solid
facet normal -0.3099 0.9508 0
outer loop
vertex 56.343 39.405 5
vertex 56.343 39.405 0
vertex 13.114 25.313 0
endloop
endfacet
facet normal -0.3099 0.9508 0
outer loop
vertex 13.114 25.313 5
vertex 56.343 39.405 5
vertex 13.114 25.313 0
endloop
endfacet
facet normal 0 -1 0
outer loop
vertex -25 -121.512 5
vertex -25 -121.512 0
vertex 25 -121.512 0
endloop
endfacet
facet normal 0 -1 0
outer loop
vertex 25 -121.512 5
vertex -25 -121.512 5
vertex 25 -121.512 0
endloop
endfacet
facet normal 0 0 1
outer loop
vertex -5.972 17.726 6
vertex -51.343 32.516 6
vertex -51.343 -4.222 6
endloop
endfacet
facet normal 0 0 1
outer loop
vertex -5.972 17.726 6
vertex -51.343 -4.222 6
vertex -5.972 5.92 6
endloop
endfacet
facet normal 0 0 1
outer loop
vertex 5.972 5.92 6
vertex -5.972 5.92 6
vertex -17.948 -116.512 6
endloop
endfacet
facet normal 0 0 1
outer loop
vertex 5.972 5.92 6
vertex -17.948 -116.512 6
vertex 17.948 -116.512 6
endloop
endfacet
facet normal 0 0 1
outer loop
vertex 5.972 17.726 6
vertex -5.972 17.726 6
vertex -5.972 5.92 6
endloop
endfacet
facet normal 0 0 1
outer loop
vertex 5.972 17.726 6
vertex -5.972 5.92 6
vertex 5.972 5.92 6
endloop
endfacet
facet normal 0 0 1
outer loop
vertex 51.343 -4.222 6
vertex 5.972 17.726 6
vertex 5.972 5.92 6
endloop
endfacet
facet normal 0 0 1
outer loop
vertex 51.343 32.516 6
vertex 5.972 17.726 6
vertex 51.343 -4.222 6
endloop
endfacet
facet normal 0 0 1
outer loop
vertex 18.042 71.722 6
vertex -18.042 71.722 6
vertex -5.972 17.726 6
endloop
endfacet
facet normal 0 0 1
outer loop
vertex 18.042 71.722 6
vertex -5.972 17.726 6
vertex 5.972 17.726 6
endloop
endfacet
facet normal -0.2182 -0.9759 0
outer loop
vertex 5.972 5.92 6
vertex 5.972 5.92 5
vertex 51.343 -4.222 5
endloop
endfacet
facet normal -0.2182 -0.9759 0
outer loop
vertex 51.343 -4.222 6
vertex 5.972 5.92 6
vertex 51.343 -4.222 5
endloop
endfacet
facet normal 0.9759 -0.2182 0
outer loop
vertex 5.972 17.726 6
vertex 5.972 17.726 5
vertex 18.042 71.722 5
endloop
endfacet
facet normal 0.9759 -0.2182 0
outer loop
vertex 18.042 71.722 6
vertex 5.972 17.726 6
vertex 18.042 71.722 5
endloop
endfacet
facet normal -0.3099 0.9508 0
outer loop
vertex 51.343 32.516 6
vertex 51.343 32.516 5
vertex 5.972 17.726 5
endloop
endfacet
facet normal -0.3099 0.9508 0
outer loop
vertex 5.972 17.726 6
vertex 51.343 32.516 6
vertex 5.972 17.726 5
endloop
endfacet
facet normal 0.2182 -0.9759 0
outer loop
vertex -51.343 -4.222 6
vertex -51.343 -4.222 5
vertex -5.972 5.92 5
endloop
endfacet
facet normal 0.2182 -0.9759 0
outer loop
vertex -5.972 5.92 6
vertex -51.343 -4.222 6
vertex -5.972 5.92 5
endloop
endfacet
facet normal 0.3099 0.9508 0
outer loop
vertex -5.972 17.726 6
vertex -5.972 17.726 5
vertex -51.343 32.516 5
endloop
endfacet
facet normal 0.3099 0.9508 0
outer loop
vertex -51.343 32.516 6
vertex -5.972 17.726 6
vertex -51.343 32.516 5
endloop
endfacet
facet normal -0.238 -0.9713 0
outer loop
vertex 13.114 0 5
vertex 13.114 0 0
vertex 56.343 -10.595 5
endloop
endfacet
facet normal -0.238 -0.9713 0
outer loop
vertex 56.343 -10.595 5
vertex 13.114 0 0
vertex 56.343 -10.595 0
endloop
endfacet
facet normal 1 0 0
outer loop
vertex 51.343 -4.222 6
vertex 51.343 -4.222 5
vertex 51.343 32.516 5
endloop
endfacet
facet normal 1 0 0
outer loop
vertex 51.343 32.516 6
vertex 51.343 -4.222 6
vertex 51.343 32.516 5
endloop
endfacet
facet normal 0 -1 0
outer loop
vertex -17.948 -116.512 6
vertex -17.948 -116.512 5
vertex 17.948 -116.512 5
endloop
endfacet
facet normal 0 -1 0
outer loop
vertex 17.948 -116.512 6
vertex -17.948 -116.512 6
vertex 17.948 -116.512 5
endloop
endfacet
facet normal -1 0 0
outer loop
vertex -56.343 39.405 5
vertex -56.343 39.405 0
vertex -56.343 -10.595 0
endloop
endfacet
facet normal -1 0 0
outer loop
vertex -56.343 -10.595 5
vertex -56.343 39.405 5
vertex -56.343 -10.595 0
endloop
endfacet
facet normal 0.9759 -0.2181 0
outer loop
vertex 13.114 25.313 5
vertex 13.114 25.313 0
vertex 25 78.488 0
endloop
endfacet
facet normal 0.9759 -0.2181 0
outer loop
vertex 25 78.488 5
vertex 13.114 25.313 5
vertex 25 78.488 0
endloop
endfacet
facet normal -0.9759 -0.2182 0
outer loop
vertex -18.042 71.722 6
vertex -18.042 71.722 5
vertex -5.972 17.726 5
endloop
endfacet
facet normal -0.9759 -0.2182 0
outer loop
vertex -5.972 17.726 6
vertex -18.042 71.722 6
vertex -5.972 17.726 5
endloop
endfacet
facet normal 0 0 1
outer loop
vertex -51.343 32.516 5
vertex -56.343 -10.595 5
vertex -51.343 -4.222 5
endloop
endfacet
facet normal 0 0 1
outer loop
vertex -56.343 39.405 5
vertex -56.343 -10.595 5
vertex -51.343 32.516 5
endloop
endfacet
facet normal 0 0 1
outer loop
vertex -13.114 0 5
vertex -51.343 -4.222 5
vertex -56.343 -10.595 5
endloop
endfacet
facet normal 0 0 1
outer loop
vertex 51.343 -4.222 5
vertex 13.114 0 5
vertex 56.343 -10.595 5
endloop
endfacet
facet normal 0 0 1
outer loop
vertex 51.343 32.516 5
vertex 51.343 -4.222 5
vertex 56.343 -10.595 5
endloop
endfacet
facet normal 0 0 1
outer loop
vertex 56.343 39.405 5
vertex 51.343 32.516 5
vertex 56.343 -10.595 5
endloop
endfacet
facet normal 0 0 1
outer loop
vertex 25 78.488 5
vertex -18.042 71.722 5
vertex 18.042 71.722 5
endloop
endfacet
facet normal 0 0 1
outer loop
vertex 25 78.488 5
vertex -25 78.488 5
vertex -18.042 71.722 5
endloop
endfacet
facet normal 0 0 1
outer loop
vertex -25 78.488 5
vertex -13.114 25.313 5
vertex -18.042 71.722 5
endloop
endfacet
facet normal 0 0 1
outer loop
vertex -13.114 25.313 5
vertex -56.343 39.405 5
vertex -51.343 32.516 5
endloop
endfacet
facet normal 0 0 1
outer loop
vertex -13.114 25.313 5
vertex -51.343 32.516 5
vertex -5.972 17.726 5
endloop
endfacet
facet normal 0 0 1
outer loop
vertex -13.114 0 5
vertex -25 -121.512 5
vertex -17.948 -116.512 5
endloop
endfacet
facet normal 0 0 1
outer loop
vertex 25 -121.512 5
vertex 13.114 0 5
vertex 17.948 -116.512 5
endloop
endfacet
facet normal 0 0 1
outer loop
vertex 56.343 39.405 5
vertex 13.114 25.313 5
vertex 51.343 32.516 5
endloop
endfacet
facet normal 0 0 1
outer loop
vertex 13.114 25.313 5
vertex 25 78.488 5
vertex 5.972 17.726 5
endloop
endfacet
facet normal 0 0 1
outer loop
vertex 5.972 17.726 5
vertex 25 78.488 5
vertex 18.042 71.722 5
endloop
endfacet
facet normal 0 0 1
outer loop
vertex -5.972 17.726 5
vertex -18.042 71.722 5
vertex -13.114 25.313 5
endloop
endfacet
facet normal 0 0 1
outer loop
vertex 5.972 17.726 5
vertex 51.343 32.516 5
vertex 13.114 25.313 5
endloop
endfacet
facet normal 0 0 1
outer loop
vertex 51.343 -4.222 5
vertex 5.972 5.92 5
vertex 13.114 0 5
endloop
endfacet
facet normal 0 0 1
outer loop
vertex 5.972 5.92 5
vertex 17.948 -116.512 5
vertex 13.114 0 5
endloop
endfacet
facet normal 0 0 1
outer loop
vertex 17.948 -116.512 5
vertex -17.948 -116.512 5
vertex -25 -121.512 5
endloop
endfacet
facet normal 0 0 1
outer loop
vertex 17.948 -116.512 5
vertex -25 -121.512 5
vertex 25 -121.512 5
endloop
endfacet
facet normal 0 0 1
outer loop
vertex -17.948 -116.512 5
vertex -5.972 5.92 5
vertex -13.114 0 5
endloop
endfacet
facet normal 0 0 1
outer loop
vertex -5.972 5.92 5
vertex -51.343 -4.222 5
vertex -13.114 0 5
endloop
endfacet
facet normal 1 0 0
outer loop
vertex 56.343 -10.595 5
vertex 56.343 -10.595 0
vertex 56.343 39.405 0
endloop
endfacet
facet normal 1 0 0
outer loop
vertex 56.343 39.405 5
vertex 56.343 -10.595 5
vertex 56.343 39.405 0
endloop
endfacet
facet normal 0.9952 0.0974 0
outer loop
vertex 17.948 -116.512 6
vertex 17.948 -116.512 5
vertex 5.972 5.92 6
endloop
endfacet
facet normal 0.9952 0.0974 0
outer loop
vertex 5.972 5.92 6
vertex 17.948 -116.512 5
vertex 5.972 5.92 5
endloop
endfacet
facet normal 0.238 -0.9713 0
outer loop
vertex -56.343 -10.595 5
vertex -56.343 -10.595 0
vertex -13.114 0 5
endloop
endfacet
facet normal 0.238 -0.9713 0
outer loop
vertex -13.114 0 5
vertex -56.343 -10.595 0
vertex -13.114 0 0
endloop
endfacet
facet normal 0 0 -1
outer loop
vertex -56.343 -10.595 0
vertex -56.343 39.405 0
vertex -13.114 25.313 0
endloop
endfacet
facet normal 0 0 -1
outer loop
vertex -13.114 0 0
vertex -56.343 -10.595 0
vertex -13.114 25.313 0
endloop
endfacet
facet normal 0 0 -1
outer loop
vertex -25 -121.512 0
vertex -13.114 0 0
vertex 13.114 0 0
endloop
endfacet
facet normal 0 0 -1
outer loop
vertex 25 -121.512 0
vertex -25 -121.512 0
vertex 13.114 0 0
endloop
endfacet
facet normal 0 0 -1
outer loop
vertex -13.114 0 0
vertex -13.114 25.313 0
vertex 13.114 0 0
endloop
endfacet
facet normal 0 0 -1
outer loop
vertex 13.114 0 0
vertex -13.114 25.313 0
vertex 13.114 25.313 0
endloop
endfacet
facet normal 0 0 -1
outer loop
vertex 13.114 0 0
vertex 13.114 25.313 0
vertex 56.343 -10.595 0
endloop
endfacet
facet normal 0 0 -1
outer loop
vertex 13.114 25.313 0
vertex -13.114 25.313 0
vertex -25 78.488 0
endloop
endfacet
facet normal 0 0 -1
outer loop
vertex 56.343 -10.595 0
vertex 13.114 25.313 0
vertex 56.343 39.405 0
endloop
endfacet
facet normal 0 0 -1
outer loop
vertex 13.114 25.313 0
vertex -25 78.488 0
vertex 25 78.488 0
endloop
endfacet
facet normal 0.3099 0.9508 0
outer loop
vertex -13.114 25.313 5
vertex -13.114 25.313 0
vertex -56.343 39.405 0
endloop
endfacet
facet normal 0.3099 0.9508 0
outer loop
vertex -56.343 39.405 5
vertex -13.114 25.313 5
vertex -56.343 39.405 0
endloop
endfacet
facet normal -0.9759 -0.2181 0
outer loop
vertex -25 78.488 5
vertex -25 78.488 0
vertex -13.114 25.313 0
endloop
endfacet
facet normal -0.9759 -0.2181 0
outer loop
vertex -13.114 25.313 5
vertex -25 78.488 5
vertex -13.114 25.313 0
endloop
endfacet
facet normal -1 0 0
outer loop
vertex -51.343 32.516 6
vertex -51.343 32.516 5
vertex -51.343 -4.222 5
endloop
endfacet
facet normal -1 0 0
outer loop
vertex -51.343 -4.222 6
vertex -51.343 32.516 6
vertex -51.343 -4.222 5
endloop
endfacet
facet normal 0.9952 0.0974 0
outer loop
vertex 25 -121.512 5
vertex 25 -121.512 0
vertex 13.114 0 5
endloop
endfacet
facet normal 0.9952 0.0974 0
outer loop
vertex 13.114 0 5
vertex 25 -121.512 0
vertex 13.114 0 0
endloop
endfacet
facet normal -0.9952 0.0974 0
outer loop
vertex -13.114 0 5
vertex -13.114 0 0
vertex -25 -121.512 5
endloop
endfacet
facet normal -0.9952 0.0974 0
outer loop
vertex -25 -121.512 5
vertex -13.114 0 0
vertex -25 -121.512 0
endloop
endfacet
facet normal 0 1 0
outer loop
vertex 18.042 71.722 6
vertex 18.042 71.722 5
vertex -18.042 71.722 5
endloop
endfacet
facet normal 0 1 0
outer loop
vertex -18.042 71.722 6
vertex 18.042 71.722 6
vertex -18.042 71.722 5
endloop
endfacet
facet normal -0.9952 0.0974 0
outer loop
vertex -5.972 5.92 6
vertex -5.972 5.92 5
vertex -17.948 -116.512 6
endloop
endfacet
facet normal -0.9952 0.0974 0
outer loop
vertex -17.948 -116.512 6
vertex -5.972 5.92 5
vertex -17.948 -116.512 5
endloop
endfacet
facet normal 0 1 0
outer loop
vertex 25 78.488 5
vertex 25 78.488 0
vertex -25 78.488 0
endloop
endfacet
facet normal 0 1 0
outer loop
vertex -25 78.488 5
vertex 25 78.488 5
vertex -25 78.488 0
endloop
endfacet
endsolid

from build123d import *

# Parameters (mm, degrees)
F1_DEPTH = 5
F2_DEPTH = 6


# Not quite as in the source:
# - a feature names something its author has since deleted; it is built from what else it names


with BuildPart() as f1:
    # F0 (on Top) → F1 (new body)
    with BuildSketch(Plane.XY):
        Polygon((25, 78.4878924489), (0, 78.4878924489), (-25, 78.4878924489), (-13.1142183076, 25.3134854138), (-56.342728436, 39.404849359), (-56.342728436, -10.595150641), (-13.1142183076, 0), (-25, -121.5121075511), (0, -121.5121075511), (25, -121.5121075511), (13.1142183076, 0), (56.342728436, -10.595150641), (56.342728436, 39.404849359), (13.1142183076, 25.3134854138), align=None)
        Polygon((-18.0415231461, 71.7220325265), (0, 71.7220325265), (18.0415231461, 71.7220325265), (5.9721833782, 17.7264265097), (51.342728436, 32.5160378311), (51.342728436, -4.2216783711), (5.9721833782, 5.9197491293), (17.9479308986, -116.5121075511), (0, -116.5121075511), (-17.9479308986, -116.5121075511), (-5.9721833782, 5.9197491293), (-51.342728436, -4.2216783711), (-51.342728436, 32.5160378311), (-5.9721833782, 17.7264265097), align=None, mode=Mode.SUBTRACT)
        Polygon((18.0415231461, 71.7220325265), (0, 71.7220325265), (-18.0415231461, 71.7220325265), (-5.9721833782, 17.7264265097), (-51.342728436, 32.5160378311), (-51.342728436, -4.2216783711), (-5.9721833782, 5.9197491293), (-17.9479308986, -116.5121075511), (0, -116.5121075511), (17.9479308986, -116.5121075511), (5.9721833782, 5.9197491293), (51.342728436, -4.2216783711), (51.342728436, 32.5160378311), (5.9721833782, 17.7264265097), align=None)
    extrude(amount=F1_DEPTH)

    # F0 (on Top) → F2 (join)
    with BuildSketch(Plane.XY):
        Polygon((18.0415231461, 71.7220325265), (0, 71.7220325265), (-18.0415231461, 71.7220325265), (-5.9721833782, 17.7264265097), (-51.342728436, 32.5160378311), (-51.342728436, -4.2216783711), (-5.9721833782, 5.9197491293), (-17.9479308986, -116.5121075511), (0, -116.5121075511), (17.9479308986, -116.5121075511), (5.9721833782, 5.9197491293), (51.342728436, -4.2216783711), (51.342728436, 32.5160378311), (5.9721833782, 17.7264265097), align=None)
    extrude(amount=F2_DEPTH)


solid = f1.part
